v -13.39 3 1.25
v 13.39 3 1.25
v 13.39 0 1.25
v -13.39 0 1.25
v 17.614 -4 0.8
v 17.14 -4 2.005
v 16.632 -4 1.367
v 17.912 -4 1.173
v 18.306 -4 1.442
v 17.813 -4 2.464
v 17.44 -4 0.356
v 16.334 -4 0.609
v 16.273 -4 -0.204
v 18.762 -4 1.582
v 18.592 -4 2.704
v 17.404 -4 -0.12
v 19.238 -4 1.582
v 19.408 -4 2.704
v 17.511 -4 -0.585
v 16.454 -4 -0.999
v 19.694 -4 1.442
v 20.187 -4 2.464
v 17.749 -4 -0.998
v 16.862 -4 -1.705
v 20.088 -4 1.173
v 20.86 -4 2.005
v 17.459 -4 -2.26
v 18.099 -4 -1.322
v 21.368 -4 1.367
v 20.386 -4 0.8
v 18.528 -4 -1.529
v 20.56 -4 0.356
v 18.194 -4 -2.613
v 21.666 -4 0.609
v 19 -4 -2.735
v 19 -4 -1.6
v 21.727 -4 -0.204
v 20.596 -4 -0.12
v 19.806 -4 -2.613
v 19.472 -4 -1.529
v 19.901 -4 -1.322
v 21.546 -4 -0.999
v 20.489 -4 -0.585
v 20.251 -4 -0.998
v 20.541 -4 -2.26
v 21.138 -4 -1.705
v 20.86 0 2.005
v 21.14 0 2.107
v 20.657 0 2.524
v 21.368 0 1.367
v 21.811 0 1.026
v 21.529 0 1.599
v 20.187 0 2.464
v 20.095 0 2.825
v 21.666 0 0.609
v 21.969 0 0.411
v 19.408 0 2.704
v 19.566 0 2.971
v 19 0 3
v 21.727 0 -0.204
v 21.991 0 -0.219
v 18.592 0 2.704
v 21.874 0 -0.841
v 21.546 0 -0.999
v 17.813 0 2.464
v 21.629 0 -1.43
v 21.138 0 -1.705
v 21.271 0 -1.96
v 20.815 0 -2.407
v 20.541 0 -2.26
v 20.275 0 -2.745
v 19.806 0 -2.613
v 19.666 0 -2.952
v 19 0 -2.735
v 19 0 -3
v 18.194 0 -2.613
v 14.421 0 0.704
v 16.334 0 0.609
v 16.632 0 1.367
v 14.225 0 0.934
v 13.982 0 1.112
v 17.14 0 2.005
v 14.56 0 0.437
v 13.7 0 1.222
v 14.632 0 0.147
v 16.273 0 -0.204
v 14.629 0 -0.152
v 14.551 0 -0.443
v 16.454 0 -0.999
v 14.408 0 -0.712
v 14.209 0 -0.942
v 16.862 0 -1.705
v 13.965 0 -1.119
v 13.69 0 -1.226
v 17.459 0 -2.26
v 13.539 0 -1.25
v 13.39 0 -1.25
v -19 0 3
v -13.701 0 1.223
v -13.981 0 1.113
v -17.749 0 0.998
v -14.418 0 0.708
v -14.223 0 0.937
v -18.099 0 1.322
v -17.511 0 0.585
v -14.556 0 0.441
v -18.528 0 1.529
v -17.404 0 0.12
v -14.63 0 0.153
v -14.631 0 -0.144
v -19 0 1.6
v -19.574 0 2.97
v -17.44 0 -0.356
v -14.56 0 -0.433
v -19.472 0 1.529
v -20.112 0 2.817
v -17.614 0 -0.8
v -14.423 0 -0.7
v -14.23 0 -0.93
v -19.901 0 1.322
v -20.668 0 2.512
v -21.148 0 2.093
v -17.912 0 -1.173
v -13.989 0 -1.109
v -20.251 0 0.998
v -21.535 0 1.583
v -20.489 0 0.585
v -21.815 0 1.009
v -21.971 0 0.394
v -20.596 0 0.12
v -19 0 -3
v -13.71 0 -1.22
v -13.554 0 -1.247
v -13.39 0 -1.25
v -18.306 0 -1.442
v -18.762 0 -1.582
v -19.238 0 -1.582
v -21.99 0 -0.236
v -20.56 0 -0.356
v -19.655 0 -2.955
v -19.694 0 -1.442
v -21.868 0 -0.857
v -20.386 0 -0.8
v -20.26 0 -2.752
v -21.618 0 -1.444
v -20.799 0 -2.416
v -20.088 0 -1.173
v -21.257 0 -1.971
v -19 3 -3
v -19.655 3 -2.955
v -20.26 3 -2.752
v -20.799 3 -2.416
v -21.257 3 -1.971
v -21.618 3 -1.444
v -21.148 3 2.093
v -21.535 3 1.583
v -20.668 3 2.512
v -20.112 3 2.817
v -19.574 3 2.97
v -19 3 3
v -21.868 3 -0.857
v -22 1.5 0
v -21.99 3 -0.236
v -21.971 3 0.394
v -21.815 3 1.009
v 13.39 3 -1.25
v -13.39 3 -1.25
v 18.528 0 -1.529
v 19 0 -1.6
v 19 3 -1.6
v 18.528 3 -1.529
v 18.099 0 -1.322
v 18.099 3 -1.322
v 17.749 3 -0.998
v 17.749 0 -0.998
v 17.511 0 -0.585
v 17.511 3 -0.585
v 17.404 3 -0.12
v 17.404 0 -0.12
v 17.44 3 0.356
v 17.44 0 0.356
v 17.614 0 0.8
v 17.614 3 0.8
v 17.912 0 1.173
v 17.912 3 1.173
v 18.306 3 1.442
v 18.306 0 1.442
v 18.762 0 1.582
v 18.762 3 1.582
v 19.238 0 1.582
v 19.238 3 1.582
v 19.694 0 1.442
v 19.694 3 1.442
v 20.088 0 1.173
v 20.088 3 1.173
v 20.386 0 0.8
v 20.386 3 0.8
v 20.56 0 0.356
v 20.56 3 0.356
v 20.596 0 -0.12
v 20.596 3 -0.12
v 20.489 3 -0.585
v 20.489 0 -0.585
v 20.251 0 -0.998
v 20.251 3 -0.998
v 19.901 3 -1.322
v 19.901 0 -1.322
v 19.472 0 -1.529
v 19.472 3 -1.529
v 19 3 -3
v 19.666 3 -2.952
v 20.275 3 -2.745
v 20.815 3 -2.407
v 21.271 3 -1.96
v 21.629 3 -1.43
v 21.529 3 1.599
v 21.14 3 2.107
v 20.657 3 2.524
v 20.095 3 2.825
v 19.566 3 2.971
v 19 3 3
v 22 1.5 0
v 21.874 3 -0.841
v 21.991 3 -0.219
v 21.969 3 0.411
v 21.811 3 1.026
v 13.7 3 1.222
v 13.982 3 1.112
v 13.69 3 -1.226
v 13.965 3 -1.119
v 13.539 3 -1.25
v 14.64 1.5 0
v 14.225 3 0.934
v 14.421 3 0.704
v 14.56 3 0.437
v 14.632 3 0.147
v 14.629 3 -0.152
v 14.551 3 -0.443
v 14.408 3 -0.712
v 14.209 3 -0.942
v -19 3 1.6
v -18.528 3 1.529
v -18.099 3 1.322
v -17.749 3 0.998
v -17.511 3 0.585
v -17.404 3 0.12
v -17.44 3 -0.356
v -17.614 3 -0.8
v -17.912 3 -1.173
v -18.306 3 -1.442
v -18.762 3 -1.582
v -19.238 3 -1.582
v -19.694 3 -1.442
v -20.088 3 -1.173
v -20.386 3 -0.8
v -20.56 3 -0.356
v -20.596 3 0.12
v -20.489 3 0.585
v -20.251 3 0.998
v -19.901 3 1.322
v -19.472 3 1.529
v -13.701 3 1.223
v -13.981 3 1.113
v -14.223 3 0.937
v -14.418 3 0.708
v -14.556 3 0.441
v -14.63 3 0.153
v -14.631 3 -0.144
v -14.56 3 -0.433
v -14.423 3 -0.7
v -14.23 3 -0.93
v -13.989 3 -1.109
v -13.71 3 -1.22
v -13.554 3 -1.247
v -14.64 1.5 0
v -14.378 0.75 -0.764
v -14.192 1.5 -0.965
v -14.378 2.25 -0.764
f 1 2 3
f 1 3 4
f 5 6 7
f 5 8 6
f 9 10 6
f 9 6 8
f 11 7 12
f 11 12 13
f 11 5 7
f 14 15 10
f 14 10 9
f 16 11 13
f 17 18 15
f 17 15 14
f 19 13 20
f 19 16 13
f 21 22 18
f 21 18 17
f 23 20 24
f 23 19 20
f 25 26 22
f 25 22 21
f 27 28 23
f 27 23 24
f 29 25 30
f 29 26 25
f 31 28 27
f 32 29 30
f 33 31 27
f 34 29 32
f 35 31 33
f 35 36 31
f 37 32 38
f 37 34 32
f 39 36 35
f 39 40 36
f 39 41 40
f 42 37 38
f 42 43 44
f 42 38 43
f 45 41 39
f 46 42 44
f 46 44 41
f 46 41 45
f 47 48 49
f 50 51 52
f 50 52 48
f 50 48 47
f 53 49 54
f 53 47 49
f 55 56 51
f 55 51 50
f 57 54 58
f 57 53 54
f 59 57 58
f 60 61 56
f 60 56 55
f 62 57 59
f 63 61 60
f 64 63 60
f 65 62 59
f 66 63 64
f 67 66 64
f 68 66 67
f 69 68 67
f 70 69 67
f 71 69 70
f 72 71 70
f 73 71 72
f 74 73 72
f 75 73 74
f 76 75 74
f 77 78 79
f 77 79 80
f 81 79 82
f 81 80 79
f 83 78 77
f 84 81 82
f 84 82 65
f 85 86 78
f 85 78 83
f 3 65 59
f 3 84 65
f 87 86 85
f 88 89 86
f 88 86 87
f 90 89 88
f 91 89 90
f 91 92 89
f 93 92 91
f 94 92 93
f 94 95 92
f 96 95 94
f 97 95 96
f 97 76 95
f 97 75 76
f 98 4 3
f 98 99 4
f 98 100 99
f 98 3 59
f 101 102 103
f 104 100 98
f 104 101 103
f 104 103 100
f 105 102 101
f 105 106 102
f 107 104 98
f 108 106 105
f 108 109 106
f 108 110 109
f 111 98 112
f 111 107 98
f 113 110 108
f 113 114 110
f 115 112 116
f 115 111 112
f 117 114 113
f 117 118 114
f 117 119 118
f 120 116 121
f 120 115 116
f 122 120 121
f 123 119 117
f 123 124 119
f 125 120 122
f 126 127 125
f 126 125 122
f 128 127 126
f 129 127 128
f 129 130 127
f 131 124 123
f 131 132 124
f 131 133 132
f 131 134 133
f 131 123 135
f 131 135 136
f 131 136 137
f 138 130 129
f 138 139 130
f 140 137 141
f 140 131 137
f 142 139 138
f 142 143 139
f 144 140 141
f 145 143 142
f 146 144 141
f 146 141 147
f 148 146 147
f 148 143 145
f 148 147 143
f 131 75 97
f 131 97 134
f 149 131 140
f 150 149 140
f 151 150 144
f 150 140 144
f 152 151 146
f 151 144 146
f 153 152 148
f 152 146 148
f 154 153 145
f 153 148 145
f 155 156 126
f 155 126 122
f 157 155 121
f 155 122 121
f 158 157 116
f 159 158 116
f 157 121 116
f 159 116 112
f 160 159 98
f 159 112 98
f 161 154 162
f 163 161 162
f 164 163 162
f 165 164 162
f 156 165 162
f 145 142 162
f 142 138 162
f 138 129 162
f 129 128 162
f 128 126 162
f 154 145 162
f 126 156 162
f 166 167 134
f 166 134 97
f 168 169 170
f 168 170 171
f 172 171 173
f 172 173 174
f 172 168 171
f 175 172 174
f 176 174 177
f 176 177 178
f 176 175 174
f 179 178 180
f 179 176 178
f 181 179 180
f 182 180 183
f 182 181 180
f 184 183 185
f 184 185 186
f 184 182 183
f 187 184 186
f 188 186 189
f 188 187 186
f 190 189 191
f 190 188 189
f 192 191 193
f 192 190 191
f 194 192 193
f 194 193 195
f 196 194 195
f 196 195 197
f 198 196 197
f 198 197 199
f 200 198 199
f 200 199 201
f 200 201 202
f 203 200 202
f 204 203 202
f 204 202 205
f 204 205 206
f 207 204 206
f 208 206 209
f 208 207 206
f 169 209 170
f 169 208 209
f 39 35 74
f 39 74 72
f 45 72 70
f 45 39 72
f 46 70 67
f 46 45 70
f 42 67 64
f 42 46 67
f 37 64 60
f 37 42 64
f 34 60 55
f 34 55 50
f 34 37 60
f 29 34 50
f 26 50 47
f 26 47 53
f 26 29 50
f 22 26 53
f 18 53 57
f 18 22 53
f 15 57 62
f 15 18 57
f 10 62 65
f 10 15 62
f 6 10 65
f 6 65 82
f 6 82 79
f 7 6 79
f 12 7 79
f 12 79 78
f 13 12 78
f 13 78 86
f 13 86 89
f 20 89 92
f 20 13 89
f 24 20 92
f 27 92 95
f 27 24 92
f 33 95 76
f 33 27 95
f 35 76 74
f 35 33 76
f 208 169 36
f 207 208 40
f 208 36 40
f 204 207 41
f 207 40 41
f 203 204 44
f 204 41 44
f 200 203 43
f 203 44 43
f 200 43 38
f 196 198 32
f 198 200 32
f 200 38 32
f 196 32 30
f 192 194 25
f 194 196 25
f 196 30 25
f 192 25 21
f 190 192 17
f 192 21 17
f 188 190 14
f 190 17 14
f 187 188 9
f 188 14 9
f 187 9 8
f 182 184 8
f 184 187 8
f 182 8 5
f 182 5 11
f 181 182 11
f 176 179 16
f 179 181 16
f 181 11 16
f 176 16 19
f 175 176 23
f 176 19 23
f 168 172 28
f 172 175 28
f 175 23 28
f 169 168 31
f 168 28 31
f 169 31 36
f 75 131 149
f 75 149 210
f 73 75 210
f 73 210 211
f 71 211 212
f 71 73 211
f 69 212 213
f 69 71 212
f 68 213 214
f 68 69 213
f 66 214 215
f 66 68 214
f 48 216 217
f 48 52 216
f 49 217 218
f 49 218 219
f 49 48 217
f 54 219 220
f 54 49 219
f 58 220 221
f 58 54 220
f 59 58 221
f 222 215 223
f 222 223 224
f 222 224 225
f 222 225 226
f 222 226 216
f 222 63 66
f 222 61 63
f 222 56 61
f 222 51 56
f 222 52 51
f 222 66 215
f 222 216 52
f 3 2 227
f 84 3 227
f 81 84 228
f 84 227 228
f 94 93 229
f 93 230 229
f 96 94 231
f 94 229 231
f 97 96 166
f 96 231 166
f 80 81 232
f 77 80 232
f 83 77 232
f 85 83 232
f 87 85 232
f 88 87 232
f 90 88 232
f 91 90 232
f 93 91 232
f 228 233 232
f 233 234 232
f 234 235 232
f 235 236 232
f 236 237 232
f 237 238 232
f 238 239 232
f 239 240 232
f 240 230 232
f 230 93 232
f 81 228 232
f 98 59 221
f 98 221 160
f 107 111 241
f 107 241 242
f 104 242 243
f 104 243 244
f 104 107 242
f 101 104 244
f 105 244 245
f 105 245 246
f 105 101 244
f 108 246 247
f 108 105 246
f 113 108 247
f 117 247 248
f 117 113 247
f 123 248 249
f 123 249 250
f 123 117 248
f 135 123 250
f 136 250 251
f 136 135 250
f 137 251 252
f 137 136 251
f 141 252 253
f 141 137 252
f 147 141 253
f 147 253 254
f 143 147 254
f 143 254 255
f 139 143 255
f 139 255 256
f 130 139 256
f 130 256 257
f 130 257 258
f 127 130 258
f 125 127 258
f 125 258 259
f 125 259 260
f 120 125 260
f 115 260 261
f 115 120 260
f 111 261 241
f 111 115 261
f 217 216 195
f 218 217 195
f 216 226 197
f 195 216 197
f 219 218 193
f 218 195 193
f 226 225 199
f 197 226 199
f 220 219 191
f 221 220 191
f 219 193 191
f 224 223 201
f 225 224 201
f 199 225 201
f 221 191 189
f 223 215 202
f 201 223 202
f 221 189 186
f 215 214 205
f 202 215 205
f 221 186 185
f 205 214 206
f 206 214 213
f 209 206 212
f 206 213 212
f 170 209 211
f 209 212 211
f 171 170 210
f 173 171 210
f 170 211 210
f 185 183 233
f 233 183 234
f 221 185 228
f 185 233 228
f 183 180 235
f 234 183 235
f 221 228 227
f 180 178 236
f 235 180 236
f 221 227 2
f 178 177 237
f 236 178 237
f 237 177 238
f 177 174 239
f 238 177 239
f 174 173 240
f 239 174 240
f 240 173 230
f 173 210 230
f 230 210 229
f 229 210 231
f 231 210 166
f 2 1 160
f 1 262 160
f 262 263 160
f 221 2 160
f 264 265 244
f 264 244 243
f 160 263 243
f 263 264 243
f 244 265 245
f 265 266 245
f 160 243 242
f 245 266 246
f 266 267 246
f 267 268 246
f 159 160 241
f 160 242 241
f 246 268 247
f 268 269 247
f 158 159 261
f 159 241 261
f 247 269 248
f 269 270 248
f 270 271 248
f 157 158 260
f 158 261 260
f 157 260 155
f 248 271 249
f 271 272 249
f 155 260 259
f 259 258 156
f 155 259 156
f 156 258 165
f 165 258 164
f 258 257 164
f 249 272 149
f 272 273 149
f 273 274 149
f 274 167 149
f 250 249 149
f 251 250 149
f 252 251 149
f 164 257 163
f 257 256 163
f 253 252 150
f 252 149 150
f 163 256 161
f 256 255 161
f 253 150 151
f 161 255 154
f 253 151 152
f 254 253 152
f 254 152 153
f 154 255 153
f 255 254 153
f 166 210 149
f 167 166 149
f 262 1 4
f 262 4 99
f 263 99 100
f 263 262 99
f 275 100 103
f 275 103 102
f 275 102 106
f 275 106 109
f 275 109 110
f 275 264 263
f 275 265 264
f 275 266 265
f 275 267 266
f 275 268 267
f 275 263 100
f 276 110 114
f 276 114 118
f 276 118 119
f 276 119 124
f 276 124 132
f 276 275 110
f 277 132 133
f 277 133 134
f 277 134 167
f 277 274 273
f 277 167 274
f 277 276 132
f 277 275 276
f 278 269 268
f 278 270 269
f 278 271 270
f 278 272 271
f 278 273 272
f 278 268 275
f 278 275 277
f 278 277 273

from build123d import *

# Parameters (mm, degrees)
ESQUISSE1_R             = 1.6
BOSS_EXTRU_1_DEPTH      = 3
BOSS_EXTRU_2_START      = 4
ESQUISSE2_R             = 2.734743529
ESQUISSE2_R_2           = 1.6
BOSS_EXTRU_2_DEPTH      = 4
ENL_V_MAT_EXTRU_1_DEPTH = 3


with BuildPart() as part:
    # Esquisse1 → Boss.-Extru.1 (new body)
    with BuildSketch(Plane(origin=(0, 0, 0), x_dir=(1, 0, 0), z_dir=(0, 1, 0))):
        with BuildLine():
            Line((-19, 3), (19, 3))
            add(Edge.make_bspline(
                [(19, 3), (20.68639149, 3.094620003), (23.315621509, 0.000753175), (20.682364624, -3.097569459), (19, -3)],
                knots=[0, 0, 0, 0, 0.499941737, 1, 1, 1, 1], degree=3))
            Line((19, -3), (-19, -3))
            add(Edge.make_bspline(
                [(-19, 3), (-20.661097815, 3.102497637), (-23.341647105, 0.00157467), (-20.655607875, -3.105760191), (-19, -3)],
                knots=[0, 0, 0, 0, 0.499995441, 1, 1, 1, 1], degree=3))
        make_face()
        with Locations(Location((-19, 0, 0), (0, 0, 270))):
            Circle(ESQUISSE1_R, mode=Mode.SUBTRACT)
        with Locations(Location((19, 0, 0), (0, 0, 90))):
            Circle(ESQUISSE1_R, mode=Mode.SUBTRACT)
    extrude(amount=BOSS_EXTRU_1_DEPTH)

    # Esquisse2 → Boss.-Extru.2 (add)
    with BuildSketch(Plane.XZ.offset(BOSS_EXTRU_2_START)):
        with Locations(Location((19, 0, 0), (0, 0, 270))):
            Circle(ESQUISSE2_R)
        with Locations(Location((19, 0, 0), (0, 0, 270))):
            Circle(ESQUISSE2_R_2, mode=Mode.SUBTRACT)
    extrude(amount=-BOSS_EXTRU_2_DEPTH)

    # Esquisse3 → Enlèv. mat.-Extru.1 (cut)
    with BuildSketch(Plane(origin=(0, 3, 0), x_dir=(1, 0, 0), z_dir=(0, 1, 0))):
        with BuildLine():
            Line((13.390376778, -1.25), (-13.390376778, -1.25))
            add(Edge.make_bspline(
                [(-13.390376778, -1.25), (-14.091002552, -1.290578927), (-15.1894504, 0.000117245), (-14.091603718, 1.290145329), (-13.390376778, 1.25)],
                knots=[0, 0, 0, 0, 0.500019288, 1, 1, 1, 1], degree=3))
            Line((-13.390376778, 1.25), (13.390376778, 1.25))
            add(Edge.make_bspline(
                [(13.390376778, -1.25), (14.084933338, -1.288382663), (15.205457343, -0.00659589), (14.065682357, 1.298551464), (13.390376778, 1.25)],
                knots=[0, 0, 0, 0, 0.500292138, 1, 1, 1, 1], degree=3))
        make_face()
    extrude(amount=-ENL_V_MAT_EXTRU_1_DEPTH, mode=Mode.SUBTRACT)


solid = part.part
